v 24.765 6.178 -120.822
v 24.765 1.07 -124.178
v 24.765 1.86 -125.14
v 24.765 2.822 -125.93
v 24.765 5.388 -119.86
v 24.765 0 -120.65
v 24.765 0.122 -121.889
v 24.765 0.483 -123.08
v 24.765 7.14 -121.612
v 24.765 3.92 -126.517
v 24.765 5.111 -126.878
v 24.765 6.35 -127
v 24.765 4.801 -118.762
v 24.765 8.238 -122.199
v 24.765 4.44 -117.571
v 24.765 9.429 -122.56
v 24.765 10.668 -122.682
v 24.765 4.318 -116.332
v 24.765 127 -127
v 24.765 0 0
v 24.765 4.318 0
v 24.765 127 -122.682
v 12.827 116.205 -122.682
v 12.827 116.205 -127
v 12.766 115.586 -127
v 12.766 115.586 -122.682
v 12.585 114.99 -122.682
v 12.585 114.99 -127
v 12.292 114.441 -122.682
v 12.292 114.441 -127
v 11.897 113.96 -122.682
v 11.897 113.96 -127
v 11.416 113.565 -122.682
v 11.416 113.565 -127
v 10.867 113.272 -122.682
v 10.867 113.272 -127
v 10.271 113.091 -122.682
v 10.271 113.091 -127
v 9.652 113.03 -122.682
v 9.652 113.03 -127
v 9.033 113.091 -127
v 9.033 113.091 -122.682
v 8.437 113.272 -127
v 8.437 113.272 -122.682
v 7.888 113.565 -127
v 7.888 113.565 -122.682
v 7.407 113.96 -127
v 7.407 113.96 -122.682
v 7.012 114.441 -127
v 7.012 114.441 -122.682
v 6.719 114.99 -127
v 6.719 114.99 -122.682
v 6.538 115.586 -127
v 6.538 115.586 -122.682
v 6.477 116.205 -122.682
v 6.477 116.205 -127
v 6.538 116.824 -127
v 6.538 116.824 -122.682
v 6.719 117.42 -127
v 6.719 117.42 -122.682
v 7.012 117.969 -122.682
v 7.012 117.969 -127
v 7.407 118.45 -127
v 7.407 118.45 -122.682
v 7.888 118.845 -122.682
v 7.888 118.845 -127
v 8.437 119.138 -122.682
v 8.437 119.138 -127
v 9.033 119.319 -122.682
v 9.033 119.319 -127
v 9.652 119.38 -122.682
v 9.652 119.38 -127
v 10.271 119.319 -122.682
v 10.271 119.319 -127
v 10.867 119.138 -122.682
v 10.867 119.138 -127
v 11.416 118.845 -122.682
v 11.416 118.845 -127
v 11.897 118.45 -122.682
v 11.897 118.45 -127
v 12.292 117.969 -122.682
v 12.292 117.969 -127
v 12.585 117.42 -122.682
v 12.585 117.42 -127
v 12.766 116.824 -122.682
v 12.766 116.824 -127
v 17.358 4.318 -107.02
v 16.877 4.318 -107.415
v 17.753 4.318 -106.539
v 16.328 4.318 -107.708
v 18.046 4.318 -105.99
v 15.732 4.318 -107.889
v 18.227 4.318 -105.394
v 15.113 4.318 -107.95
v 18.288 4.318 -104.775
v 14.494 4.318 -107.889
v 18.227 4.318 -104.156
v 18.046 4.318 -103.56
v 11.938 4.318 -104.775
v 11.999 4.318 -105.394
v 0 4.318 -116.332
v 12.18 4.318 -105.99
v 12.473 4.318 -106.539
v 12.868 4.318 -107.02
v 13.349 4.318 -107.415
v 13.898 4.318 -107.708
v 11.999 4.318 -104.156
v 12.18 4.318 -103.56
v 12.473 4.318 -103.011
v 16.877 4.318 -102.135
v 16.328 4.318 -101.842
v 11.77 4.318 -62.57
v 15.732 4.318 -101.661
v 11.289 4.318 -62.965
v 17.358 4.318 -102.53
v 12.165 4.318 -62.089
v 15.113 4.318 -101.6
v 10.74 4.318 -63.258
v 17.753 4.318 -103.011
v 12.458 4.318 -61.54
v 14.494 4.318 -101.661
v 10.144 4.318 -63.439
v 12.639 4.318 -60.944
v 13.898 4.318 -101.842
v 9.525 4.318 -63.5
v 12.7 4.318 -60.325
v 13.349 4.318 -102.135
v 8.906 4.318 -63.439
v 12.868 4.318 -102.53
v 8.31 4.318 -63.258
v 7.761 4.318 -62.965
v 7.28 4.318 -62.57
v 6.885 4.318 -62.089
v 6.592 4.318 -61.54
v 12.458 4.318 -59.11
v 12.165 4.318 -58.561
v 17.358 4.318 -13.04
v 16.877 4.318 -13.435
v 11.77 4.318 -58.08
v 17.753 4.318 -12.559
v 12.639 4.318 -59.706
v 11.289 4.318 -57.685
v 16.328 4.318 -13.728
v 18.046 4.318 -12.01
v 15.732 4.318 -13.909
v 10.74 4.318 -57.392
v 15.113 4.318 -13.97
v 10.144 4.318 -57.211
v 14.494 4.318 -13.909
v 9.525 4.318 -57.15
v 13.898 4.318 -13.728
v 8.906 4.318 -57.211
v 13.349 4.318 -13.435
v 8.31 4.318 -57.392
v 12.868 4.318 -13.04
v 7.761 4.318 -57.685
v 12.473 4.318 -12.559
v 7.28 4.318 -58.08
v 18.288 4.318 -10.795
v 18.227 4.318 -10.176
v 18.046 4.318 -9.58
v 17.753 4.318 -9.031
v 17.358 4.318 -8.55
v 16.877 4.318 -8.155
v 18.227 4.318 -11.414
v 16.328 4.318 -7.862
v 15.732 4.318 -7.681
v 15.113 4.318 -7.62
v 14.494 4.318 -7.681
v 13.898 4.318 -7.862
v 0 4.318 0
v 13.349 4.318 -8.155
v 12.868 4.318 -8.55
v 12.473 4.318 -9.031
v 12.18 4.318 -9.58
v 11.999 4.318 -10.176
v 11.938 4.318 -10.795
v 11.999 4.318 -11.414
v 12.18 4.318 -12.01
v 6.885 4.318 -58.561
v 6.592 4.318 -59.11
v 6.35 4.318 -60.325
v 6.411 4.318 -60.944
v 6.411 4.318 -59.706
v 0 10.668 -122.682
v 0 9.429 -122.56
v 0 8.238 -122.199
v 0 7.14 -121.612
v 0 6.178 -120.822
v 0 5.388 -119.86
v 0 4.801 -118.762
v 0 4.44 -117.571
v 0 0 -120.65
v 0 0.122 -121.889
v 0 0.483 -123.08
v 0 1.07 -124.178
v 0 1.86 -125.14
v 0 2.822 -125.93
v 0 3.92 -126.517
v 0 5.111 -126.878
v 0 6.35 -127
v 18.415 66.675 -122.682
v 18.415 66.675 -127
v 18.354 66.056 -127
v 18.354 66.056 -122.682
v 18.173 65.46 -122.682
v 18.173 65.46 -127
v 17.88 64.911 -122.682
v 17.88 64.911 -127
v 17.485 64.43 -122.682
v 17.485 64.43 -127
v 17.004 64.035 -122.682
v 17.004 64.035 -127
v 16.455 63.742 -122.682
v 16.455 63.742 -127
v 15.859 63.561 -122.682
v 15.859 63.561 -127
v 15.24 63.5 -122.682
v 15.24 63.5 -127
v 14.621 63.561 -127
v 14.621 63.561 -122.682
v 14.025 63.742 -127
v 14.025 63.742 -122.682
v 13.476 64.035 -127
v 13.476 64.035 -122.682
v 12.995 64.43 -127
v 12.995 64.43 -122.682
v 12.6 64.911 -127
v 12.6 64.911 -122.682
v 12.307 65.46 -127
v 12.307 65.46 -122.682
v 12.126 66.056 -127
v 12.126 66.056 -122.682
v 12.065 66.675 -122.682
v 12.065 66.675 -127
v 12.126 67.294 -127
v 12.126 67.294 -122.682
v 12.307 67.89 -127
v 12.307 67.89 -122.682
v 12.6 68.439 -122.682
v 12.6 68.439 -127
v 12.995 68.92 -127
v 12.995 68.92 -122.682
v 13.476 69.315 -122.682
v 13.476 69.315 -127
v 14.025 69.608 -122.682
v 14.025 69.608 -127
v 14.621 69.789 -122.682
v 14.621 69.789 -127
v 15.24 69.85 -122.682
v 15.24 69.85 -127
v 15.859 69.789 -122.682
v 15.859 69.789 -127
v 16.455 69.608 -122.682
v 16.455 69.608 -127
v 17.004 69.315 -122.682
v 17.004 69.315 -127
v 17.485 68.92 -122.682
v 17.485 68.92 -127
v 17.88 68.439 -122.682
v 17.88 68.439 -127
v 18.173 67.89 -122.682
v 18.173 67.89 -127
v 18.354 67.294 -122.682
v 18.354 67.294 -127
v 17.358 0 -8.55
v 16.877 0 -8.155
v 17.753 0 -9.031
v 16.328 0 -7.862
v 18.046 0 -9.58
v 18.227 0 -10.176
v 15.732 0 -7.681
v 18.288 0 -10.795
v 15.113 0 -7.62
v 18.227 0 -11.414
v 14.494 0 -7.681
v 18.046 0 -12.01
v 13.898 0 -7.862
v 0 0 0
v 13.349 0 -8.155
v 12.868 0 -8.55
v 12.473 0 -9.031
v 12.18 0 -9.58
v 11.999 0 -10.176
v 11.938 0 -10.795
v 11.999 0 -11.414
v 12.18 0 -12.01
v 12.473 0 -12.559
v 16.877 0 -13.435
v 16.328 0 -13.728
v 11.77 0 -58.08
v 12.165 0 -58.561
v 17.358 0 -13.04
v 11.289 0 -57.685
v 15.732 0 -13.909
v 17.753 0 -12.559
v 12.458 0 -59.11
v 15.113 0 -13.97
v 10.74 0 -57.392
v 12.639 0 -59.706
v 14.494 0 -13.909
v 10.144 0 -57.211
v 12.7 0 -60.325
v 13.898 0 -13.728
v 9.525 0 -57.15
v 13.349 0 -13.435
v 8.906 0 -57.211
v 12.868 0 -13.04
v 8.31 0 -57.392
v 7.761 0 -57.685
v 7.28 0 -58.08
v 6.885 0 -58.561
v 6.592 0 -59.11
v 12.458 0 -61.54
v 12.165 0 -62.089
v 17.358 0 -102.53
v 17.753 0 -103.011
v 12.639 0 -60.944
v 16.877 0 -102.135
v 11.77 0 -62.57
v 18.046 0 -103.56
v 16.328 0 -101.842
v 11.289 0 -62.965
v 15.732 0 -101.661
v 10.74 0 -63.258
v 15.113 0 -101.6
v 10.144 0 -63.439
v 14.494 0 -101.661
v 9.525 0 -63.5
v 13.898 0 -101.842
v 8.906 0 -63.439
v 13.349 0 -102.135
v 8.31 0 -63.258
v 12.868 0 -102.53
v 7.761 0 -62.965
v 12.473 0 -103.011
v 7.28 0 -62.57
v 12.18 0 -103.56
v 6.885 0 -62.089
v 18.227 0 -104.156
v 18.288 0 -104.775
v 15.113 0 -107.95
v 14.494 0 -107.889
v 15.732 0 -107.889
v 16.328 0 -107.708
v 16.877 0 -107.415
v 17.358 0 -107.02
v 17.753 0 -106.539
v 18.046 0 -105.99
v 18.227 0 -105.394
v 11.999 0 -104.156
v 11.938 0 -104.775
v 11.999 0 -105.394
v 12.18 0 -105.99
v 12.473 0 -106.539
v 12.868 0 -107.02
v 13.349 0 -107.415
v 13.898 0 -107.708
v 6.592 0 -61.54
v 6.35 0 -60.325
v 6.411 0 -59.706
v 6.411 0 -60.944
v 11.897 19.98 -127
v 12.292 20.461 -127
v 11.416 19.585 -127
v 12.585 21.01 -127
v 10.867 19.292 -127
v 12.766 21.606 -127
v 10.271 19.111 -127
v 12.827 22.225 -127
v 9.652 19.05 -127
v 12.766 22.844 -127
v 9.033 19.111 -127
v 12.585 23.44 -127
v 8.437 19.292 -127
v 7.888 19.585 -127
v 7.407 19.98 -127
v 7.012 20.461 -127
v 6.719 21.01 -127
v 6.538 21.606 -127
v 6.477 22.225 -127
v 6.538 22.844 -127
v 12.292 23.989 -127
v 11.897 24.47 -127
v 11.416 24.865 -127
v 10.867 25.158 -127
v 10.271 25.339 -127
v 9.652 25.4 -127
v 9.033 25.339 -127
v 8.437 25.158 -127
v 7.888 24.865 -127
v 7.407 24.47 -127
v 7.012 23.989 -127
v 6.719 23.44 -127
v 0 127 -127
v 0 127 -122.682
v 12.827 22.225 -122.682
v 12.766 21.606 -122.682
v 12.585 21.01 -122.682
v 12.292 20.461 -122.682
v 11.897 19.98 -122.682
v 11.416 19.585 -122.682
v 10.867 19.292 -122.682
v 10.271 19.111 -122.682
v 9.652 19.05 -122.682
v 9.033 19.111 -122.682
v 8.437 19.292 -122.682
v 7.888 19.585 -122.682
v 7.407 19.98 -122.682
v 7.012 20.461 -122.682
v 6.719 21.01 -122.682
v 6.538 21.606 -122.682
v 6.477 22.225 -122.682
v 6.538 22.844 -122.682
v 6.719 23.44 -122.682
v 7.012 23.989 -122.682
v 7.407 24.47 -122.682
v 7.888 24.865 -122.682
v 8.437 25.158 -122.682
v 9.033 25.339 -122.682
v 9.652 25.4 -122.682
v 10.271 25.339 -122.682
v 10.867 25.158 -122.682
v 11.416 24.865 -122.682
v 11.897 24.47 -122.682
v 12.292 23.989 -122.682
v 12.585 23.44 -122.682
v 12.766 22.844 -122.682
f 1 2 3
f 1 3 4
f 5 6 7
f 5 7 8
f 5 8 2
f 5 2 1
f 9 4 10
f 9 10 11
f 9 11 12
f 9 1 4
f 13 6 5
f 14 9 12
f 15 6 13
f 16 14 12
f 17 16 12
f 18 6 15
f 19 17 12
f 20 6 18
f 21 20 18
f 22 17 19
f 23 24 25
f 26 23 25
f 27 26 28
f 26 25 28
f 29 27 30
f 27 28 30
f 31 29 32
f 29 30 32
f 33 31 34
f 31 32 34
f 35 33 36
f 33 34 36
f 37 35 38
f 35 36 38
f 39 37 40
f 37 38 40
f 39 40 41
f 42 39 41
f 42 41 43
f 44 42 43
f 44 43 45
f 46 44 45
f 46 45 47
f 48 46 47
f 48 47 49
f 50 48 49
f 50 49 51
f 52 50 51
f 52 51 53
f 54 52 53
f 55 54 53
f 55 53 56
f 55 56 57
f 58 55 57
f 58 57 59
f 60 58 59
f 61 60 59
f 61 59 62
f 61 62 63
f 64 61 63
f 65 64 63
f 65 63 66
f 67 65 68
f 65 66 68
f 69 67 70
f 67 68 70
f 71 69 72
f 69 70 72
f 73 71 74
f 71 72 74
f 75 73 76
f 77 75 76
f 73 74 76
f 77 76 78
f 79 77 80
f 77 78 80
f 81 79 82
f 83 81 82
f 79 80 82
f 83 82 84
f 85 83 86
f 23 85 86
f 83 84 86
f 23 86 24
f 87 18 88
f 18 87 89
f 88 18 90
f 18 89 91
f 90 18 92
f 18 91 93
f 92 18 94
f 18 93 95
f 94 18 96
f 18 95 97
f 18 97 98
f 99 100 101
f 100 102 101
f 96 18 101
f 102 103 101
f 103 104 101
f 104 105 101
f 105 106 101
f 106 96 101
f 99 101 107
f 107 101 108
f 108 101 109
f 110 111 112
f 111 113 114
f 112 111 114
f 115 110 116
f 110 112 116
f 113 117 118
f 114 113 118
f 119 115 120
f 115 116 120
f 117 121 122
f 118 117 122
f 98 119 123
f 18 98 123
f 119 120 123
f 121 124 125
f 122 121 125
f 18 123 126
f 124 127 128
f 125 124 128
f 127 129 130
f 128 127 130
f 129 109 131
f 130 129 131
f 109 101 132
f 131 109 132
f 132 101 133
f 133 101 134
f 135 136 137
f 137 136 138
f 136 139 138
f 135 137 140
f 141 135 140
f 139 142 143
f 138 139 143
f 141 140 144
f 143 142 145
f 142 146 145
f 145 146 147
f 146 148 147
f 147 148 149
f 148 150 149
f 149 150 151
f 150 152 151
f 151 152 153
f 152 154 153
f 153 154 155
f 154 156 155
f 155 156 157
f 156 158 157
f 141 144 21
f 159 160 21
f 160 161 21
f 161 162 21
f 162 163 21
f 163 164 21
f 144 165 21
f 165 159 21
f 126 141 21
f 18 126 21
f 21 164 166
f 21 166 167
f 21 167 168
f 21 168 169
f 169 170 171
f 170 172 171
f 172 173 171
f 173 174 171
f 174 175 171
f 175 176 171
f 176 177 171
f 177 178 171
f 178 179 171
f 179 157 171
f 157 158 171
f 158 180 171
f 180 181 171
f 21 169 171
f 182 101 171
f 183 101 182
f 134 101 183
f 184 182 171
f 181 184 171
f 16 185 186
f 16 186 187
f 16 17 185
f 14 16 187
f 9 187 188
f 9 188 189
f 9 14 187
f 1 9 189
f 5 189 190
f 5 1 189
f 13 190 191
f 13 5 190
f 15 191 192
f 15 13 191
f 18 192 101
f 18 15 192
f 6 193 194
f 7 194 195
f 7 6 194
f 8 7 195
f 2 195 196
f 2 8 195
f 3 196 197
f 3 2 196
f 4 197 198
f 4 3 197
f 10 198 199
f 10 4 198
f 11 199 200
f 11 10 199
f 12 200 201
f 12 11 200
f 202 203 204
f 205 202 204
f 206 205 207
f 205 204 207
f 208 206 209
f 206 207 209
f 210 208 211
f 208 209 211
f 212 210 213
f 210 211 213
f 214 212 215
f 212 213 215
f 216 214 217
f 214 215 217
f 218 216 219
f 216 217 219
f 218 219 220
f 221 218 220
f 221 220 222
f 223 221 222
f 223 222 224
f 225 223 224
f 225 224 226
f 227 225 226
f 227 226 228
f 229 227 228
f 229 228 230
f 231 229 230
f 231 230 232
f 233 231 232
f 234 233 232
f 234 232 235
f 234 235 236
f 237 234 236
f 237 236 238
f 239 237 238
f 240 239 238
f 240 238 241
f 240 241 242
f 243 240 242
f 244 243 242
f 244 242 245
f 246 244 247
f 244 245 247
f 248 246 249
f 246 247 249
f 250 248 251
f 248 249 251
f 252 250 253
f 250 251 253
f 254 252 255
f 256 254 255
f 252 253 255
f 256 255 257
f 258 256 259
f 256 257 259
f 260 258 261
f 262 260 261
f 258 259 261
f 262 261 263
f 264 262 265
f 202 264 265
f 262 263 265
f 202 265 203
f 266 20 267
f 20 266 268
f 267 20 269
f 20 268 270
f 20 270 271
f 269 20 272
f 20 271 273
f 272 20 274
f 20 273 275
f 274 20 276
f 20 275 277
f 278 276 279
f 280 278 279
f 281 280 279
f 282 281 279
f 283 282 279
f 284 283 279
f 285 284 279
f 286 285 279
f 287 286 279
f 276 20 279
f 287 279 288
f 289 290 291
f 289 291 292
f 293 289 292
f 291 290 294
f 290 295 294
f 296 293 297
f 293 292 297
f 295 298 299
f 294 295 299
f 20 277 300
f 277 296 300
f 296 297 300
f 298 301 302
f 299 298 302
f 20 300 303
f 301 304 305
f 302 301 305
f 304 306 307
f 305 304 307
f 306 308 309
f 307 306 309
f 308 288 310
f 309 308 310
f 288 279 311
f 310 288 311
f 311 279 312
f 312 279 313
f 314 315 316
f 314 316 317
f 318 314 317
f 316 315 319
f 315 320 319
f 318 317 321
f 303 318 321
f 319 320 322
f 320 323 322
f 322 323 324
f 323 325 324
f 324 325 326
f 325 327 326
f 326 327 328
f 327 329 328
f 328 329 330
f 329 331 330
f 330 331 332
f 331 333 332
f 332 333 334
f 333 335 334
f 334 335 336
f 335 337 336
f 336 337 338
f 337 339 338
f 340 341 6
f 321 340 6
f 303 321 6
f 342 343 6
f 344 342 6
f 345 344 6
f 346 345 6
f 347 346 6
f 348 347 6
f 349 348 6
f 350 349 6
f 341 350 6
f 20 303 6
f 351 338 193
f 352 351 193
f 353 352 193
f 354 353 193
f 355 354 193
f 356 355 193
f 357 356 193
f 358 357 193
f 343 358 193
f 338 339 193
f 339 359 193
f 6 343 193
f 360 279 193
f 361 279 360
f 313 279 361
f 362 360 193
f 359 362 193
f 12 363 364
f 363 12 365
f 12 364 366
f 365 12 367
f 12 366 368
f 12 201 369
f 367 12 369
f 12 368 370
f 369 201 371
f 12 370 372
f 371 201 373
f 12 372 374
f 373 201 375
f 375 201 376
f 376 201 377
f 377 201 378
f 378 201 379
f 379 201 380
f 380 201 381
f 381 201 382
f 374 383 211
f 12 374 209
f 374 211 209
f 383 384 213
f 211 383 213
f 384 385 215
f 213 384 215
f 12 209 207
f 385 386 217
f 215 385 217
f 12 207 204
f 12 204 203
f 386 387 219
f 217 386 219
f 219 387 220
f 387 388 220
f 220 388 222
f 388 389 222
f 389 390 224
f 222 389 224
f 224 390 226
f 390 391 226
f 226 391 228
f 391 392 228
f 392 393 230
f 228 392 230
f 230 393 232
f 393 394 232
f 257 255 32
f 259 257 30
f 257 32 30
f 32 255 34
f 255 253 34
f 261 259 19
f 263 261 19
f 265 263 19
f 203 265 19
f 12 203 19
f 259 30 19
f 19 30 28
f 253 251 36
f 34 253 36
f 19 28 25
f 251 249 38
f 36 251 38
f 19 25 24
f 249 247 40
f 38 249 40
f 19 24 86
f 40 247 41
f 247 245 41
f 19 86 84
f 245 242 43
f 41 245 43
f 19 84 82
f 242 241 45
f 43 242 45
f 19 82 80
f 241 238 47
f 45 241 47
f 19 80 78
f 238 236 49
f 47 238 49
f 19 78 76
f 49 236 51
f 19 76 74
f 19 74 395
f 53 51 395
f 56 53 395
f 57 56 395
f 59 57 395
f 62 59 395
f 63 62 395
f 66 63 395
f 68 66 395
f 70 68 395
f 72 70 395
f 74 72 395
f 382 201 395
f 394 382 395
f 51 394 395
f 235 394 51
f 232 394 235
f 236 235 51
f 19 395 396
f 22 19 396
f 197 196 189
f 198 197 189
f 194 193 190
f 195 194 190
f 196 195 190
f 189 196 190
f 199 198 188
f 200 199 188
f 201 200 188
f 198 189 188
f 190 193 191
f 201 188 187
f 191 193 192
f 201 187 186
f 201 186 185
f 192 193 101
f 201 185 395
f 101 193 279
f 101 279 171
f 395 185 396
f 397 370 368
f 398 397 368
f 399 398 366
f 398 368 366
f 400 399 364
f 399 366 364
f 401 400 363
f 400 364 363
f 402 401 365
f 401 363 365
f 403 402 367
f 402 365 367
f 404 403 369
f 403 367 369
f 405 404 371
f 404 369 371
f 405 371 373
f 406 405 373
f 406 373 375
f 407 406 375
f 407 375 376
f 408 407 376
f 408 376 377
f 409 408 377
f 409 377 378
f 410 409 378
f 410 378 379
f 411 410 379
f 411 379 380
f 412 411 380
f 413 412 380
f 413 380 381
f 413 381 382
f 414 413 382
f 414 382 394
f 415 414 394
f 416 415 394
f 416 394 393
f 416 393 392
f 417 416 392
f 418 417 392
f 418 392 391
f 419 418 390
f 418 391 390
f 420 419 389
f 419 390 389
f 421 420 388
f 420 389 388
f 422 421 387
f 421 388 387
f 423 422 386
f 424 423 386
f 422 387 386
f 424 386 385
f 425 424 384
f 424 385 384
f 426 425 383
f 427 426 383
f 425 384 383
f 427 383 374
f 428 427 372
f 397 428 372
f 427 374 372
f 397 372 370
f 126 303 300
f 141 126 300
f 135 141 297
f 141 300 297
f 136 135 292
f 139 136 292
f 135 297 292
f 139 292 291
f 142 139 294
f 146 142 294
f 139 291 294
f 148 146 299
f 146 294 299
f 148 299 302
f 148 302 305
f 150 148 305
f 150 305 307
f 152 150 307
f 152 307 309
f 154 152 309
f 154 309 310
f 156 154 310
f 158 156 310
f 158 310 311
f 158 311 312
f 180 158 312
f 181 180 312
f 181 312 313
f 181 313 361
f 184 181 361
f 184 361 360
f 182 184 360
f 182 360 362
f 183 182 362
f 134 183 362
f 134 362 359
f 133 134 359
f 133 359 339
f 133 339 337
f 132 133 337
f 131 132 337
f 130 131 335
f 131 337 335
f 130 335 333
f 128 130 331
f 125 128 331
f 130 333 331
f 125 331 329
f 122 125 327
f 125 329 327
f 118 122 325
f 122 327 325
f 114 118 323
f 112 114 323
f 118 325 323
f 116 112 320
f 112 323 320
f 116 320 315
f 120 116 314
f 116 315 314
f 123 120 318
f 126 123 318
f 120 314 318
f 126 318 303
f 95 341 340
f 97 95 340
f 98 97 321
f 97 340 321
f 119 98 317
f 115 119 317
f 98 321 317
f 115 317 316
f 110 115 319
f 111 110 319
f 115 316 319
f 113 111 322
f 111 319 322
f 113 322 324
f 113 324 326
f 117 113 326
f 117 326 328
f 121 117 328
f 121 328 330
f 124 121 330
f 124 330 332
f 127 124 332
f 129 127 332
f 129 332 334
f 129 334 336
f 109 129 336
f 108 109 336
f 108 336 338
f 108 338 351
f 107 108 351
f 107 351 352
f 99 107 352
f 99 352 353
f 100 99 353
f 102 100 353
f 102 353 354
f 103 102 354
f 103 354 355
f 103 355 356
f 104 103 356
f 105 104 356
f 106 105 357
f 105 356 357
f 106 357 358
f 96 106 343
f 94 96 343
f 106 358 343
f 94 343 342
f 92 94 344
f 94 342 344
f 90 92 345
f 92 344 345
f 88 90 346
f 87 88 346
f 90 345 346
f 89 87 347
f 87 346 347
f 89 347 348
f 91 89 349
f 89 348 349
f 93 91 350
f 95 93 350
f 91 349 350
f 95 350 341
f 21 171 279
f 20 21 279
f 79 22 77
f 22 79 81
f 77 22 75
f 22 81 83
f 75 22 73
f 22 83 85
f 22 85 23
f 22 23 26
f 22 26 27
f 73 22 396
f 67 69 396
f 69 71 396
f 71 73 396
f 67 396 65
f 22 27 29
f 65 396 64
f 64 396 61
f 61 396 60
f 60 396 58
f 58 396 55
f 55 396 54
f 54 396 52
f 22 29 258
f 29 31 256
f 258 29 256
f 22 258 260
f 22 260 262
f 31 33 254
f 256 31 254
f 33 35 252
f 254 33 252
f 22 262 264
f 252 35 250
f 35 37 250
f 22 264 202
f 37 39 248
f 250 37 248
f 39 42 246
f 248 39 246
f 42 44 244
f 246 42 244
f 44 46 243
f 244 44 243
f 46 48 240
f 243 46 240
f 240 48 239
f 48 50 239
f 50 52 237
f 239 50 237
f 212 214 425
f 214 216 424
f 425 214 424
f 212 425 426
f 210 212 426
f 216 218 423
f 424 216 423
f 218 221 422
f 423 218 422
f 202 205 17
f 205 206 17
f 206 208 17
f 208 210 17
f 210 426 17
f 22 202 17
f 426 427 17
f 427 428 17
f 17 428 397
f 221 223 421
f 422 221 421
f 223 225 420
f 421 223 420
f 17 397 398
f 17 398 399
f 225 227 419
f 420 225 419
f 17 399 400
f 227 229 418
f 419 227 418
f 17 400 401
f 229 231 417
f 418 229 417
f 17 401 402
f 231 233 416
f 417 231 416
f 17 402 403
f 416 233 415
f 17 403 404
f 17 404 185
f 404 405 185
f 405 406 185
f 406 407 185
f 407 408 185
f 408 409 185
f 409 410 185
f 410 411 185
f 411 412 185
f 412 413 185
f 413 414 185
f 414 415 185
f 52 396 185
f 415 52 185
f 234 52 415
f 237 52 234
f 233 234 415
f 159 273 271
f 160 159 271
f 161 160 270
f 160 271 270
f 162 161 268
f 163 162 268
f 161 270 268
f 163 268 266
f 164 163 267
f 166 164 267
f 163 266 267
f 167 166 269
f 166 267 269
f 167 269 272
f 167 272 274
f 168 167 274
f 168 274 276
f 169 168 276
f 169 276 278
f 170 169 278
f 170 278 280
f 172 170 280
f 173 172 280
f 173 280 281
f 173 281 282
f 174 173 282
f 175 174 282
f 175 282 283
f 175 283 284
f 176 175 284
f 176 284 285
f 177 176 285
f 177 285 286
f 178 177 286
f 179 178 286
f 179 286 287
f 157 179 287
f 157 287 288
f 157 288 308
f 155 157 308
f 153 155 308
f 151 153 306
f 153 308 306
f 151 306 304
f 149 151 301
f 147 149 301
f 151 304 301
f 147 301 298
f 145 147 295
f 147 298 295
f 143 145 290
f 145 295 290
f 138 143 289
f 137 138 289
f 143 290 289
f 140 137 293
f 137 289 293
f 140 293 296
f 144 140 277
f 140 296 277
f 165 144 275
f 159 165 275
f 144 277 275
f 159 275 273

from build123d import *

# Parameters (mm, degrees)
F1_DEPTH = 24.765
F2_R     = 6.35
F3_R     = 3.175
F4_DEPTH = 127.001
F5_R     = 3.175
F6_DEPTH = 127.001


with BuildPart() as f1:
    # F0 (on Right) → F1 (new body)
    with BuildSketch(Plane.YZ):
        Polygon((4.318, 0), (0, 0), (0, -127), (127, -127), (127, -122.682), (4.318, -122.682), align=None)
    extrude(amount=F1_DEPTH)

    # F2
    f2_edges = [f1.edges().sort_by_distance(p)[0] for p in [
        (12.3825, 4.318, -122.682),
        (12.3825, 0, -127),
    ]]
    fillet(f2_edges, radius=F2_R)

    # F3 (on face) → F4 (cut, through all)
    with BuildSketch(Plane.XZ):
        with Locations((15.113, -104.775)):
            Circle(F3_R)
        with Locations((9.525, -60.325)):
            Circle(F3_R)
        with Locations((15.113, -10.795)):
            Circle(F3_R)
    extrude(amount=-F4_DEPTH, mode=Mode.SUBTRACT)

    # F5 (on face) → F6 (cut, through all)
    with BuildSketch(Plane(origin=(0, 0, -127), x_dir=(1, 0, 0), z_dir=(0, 0, -1))):
        with Locations((9.652, -116.205)):
            Circle(F5_R)
        with Locations((15.24, -66.675)):
            Circle(F5_R)
        with Locations((9.652, -22.225)):
            Circle(F5_R)
    extrude(amount=-F6_DEPTH, mode=Mode.SUBTRACT)


solid = f1.part
